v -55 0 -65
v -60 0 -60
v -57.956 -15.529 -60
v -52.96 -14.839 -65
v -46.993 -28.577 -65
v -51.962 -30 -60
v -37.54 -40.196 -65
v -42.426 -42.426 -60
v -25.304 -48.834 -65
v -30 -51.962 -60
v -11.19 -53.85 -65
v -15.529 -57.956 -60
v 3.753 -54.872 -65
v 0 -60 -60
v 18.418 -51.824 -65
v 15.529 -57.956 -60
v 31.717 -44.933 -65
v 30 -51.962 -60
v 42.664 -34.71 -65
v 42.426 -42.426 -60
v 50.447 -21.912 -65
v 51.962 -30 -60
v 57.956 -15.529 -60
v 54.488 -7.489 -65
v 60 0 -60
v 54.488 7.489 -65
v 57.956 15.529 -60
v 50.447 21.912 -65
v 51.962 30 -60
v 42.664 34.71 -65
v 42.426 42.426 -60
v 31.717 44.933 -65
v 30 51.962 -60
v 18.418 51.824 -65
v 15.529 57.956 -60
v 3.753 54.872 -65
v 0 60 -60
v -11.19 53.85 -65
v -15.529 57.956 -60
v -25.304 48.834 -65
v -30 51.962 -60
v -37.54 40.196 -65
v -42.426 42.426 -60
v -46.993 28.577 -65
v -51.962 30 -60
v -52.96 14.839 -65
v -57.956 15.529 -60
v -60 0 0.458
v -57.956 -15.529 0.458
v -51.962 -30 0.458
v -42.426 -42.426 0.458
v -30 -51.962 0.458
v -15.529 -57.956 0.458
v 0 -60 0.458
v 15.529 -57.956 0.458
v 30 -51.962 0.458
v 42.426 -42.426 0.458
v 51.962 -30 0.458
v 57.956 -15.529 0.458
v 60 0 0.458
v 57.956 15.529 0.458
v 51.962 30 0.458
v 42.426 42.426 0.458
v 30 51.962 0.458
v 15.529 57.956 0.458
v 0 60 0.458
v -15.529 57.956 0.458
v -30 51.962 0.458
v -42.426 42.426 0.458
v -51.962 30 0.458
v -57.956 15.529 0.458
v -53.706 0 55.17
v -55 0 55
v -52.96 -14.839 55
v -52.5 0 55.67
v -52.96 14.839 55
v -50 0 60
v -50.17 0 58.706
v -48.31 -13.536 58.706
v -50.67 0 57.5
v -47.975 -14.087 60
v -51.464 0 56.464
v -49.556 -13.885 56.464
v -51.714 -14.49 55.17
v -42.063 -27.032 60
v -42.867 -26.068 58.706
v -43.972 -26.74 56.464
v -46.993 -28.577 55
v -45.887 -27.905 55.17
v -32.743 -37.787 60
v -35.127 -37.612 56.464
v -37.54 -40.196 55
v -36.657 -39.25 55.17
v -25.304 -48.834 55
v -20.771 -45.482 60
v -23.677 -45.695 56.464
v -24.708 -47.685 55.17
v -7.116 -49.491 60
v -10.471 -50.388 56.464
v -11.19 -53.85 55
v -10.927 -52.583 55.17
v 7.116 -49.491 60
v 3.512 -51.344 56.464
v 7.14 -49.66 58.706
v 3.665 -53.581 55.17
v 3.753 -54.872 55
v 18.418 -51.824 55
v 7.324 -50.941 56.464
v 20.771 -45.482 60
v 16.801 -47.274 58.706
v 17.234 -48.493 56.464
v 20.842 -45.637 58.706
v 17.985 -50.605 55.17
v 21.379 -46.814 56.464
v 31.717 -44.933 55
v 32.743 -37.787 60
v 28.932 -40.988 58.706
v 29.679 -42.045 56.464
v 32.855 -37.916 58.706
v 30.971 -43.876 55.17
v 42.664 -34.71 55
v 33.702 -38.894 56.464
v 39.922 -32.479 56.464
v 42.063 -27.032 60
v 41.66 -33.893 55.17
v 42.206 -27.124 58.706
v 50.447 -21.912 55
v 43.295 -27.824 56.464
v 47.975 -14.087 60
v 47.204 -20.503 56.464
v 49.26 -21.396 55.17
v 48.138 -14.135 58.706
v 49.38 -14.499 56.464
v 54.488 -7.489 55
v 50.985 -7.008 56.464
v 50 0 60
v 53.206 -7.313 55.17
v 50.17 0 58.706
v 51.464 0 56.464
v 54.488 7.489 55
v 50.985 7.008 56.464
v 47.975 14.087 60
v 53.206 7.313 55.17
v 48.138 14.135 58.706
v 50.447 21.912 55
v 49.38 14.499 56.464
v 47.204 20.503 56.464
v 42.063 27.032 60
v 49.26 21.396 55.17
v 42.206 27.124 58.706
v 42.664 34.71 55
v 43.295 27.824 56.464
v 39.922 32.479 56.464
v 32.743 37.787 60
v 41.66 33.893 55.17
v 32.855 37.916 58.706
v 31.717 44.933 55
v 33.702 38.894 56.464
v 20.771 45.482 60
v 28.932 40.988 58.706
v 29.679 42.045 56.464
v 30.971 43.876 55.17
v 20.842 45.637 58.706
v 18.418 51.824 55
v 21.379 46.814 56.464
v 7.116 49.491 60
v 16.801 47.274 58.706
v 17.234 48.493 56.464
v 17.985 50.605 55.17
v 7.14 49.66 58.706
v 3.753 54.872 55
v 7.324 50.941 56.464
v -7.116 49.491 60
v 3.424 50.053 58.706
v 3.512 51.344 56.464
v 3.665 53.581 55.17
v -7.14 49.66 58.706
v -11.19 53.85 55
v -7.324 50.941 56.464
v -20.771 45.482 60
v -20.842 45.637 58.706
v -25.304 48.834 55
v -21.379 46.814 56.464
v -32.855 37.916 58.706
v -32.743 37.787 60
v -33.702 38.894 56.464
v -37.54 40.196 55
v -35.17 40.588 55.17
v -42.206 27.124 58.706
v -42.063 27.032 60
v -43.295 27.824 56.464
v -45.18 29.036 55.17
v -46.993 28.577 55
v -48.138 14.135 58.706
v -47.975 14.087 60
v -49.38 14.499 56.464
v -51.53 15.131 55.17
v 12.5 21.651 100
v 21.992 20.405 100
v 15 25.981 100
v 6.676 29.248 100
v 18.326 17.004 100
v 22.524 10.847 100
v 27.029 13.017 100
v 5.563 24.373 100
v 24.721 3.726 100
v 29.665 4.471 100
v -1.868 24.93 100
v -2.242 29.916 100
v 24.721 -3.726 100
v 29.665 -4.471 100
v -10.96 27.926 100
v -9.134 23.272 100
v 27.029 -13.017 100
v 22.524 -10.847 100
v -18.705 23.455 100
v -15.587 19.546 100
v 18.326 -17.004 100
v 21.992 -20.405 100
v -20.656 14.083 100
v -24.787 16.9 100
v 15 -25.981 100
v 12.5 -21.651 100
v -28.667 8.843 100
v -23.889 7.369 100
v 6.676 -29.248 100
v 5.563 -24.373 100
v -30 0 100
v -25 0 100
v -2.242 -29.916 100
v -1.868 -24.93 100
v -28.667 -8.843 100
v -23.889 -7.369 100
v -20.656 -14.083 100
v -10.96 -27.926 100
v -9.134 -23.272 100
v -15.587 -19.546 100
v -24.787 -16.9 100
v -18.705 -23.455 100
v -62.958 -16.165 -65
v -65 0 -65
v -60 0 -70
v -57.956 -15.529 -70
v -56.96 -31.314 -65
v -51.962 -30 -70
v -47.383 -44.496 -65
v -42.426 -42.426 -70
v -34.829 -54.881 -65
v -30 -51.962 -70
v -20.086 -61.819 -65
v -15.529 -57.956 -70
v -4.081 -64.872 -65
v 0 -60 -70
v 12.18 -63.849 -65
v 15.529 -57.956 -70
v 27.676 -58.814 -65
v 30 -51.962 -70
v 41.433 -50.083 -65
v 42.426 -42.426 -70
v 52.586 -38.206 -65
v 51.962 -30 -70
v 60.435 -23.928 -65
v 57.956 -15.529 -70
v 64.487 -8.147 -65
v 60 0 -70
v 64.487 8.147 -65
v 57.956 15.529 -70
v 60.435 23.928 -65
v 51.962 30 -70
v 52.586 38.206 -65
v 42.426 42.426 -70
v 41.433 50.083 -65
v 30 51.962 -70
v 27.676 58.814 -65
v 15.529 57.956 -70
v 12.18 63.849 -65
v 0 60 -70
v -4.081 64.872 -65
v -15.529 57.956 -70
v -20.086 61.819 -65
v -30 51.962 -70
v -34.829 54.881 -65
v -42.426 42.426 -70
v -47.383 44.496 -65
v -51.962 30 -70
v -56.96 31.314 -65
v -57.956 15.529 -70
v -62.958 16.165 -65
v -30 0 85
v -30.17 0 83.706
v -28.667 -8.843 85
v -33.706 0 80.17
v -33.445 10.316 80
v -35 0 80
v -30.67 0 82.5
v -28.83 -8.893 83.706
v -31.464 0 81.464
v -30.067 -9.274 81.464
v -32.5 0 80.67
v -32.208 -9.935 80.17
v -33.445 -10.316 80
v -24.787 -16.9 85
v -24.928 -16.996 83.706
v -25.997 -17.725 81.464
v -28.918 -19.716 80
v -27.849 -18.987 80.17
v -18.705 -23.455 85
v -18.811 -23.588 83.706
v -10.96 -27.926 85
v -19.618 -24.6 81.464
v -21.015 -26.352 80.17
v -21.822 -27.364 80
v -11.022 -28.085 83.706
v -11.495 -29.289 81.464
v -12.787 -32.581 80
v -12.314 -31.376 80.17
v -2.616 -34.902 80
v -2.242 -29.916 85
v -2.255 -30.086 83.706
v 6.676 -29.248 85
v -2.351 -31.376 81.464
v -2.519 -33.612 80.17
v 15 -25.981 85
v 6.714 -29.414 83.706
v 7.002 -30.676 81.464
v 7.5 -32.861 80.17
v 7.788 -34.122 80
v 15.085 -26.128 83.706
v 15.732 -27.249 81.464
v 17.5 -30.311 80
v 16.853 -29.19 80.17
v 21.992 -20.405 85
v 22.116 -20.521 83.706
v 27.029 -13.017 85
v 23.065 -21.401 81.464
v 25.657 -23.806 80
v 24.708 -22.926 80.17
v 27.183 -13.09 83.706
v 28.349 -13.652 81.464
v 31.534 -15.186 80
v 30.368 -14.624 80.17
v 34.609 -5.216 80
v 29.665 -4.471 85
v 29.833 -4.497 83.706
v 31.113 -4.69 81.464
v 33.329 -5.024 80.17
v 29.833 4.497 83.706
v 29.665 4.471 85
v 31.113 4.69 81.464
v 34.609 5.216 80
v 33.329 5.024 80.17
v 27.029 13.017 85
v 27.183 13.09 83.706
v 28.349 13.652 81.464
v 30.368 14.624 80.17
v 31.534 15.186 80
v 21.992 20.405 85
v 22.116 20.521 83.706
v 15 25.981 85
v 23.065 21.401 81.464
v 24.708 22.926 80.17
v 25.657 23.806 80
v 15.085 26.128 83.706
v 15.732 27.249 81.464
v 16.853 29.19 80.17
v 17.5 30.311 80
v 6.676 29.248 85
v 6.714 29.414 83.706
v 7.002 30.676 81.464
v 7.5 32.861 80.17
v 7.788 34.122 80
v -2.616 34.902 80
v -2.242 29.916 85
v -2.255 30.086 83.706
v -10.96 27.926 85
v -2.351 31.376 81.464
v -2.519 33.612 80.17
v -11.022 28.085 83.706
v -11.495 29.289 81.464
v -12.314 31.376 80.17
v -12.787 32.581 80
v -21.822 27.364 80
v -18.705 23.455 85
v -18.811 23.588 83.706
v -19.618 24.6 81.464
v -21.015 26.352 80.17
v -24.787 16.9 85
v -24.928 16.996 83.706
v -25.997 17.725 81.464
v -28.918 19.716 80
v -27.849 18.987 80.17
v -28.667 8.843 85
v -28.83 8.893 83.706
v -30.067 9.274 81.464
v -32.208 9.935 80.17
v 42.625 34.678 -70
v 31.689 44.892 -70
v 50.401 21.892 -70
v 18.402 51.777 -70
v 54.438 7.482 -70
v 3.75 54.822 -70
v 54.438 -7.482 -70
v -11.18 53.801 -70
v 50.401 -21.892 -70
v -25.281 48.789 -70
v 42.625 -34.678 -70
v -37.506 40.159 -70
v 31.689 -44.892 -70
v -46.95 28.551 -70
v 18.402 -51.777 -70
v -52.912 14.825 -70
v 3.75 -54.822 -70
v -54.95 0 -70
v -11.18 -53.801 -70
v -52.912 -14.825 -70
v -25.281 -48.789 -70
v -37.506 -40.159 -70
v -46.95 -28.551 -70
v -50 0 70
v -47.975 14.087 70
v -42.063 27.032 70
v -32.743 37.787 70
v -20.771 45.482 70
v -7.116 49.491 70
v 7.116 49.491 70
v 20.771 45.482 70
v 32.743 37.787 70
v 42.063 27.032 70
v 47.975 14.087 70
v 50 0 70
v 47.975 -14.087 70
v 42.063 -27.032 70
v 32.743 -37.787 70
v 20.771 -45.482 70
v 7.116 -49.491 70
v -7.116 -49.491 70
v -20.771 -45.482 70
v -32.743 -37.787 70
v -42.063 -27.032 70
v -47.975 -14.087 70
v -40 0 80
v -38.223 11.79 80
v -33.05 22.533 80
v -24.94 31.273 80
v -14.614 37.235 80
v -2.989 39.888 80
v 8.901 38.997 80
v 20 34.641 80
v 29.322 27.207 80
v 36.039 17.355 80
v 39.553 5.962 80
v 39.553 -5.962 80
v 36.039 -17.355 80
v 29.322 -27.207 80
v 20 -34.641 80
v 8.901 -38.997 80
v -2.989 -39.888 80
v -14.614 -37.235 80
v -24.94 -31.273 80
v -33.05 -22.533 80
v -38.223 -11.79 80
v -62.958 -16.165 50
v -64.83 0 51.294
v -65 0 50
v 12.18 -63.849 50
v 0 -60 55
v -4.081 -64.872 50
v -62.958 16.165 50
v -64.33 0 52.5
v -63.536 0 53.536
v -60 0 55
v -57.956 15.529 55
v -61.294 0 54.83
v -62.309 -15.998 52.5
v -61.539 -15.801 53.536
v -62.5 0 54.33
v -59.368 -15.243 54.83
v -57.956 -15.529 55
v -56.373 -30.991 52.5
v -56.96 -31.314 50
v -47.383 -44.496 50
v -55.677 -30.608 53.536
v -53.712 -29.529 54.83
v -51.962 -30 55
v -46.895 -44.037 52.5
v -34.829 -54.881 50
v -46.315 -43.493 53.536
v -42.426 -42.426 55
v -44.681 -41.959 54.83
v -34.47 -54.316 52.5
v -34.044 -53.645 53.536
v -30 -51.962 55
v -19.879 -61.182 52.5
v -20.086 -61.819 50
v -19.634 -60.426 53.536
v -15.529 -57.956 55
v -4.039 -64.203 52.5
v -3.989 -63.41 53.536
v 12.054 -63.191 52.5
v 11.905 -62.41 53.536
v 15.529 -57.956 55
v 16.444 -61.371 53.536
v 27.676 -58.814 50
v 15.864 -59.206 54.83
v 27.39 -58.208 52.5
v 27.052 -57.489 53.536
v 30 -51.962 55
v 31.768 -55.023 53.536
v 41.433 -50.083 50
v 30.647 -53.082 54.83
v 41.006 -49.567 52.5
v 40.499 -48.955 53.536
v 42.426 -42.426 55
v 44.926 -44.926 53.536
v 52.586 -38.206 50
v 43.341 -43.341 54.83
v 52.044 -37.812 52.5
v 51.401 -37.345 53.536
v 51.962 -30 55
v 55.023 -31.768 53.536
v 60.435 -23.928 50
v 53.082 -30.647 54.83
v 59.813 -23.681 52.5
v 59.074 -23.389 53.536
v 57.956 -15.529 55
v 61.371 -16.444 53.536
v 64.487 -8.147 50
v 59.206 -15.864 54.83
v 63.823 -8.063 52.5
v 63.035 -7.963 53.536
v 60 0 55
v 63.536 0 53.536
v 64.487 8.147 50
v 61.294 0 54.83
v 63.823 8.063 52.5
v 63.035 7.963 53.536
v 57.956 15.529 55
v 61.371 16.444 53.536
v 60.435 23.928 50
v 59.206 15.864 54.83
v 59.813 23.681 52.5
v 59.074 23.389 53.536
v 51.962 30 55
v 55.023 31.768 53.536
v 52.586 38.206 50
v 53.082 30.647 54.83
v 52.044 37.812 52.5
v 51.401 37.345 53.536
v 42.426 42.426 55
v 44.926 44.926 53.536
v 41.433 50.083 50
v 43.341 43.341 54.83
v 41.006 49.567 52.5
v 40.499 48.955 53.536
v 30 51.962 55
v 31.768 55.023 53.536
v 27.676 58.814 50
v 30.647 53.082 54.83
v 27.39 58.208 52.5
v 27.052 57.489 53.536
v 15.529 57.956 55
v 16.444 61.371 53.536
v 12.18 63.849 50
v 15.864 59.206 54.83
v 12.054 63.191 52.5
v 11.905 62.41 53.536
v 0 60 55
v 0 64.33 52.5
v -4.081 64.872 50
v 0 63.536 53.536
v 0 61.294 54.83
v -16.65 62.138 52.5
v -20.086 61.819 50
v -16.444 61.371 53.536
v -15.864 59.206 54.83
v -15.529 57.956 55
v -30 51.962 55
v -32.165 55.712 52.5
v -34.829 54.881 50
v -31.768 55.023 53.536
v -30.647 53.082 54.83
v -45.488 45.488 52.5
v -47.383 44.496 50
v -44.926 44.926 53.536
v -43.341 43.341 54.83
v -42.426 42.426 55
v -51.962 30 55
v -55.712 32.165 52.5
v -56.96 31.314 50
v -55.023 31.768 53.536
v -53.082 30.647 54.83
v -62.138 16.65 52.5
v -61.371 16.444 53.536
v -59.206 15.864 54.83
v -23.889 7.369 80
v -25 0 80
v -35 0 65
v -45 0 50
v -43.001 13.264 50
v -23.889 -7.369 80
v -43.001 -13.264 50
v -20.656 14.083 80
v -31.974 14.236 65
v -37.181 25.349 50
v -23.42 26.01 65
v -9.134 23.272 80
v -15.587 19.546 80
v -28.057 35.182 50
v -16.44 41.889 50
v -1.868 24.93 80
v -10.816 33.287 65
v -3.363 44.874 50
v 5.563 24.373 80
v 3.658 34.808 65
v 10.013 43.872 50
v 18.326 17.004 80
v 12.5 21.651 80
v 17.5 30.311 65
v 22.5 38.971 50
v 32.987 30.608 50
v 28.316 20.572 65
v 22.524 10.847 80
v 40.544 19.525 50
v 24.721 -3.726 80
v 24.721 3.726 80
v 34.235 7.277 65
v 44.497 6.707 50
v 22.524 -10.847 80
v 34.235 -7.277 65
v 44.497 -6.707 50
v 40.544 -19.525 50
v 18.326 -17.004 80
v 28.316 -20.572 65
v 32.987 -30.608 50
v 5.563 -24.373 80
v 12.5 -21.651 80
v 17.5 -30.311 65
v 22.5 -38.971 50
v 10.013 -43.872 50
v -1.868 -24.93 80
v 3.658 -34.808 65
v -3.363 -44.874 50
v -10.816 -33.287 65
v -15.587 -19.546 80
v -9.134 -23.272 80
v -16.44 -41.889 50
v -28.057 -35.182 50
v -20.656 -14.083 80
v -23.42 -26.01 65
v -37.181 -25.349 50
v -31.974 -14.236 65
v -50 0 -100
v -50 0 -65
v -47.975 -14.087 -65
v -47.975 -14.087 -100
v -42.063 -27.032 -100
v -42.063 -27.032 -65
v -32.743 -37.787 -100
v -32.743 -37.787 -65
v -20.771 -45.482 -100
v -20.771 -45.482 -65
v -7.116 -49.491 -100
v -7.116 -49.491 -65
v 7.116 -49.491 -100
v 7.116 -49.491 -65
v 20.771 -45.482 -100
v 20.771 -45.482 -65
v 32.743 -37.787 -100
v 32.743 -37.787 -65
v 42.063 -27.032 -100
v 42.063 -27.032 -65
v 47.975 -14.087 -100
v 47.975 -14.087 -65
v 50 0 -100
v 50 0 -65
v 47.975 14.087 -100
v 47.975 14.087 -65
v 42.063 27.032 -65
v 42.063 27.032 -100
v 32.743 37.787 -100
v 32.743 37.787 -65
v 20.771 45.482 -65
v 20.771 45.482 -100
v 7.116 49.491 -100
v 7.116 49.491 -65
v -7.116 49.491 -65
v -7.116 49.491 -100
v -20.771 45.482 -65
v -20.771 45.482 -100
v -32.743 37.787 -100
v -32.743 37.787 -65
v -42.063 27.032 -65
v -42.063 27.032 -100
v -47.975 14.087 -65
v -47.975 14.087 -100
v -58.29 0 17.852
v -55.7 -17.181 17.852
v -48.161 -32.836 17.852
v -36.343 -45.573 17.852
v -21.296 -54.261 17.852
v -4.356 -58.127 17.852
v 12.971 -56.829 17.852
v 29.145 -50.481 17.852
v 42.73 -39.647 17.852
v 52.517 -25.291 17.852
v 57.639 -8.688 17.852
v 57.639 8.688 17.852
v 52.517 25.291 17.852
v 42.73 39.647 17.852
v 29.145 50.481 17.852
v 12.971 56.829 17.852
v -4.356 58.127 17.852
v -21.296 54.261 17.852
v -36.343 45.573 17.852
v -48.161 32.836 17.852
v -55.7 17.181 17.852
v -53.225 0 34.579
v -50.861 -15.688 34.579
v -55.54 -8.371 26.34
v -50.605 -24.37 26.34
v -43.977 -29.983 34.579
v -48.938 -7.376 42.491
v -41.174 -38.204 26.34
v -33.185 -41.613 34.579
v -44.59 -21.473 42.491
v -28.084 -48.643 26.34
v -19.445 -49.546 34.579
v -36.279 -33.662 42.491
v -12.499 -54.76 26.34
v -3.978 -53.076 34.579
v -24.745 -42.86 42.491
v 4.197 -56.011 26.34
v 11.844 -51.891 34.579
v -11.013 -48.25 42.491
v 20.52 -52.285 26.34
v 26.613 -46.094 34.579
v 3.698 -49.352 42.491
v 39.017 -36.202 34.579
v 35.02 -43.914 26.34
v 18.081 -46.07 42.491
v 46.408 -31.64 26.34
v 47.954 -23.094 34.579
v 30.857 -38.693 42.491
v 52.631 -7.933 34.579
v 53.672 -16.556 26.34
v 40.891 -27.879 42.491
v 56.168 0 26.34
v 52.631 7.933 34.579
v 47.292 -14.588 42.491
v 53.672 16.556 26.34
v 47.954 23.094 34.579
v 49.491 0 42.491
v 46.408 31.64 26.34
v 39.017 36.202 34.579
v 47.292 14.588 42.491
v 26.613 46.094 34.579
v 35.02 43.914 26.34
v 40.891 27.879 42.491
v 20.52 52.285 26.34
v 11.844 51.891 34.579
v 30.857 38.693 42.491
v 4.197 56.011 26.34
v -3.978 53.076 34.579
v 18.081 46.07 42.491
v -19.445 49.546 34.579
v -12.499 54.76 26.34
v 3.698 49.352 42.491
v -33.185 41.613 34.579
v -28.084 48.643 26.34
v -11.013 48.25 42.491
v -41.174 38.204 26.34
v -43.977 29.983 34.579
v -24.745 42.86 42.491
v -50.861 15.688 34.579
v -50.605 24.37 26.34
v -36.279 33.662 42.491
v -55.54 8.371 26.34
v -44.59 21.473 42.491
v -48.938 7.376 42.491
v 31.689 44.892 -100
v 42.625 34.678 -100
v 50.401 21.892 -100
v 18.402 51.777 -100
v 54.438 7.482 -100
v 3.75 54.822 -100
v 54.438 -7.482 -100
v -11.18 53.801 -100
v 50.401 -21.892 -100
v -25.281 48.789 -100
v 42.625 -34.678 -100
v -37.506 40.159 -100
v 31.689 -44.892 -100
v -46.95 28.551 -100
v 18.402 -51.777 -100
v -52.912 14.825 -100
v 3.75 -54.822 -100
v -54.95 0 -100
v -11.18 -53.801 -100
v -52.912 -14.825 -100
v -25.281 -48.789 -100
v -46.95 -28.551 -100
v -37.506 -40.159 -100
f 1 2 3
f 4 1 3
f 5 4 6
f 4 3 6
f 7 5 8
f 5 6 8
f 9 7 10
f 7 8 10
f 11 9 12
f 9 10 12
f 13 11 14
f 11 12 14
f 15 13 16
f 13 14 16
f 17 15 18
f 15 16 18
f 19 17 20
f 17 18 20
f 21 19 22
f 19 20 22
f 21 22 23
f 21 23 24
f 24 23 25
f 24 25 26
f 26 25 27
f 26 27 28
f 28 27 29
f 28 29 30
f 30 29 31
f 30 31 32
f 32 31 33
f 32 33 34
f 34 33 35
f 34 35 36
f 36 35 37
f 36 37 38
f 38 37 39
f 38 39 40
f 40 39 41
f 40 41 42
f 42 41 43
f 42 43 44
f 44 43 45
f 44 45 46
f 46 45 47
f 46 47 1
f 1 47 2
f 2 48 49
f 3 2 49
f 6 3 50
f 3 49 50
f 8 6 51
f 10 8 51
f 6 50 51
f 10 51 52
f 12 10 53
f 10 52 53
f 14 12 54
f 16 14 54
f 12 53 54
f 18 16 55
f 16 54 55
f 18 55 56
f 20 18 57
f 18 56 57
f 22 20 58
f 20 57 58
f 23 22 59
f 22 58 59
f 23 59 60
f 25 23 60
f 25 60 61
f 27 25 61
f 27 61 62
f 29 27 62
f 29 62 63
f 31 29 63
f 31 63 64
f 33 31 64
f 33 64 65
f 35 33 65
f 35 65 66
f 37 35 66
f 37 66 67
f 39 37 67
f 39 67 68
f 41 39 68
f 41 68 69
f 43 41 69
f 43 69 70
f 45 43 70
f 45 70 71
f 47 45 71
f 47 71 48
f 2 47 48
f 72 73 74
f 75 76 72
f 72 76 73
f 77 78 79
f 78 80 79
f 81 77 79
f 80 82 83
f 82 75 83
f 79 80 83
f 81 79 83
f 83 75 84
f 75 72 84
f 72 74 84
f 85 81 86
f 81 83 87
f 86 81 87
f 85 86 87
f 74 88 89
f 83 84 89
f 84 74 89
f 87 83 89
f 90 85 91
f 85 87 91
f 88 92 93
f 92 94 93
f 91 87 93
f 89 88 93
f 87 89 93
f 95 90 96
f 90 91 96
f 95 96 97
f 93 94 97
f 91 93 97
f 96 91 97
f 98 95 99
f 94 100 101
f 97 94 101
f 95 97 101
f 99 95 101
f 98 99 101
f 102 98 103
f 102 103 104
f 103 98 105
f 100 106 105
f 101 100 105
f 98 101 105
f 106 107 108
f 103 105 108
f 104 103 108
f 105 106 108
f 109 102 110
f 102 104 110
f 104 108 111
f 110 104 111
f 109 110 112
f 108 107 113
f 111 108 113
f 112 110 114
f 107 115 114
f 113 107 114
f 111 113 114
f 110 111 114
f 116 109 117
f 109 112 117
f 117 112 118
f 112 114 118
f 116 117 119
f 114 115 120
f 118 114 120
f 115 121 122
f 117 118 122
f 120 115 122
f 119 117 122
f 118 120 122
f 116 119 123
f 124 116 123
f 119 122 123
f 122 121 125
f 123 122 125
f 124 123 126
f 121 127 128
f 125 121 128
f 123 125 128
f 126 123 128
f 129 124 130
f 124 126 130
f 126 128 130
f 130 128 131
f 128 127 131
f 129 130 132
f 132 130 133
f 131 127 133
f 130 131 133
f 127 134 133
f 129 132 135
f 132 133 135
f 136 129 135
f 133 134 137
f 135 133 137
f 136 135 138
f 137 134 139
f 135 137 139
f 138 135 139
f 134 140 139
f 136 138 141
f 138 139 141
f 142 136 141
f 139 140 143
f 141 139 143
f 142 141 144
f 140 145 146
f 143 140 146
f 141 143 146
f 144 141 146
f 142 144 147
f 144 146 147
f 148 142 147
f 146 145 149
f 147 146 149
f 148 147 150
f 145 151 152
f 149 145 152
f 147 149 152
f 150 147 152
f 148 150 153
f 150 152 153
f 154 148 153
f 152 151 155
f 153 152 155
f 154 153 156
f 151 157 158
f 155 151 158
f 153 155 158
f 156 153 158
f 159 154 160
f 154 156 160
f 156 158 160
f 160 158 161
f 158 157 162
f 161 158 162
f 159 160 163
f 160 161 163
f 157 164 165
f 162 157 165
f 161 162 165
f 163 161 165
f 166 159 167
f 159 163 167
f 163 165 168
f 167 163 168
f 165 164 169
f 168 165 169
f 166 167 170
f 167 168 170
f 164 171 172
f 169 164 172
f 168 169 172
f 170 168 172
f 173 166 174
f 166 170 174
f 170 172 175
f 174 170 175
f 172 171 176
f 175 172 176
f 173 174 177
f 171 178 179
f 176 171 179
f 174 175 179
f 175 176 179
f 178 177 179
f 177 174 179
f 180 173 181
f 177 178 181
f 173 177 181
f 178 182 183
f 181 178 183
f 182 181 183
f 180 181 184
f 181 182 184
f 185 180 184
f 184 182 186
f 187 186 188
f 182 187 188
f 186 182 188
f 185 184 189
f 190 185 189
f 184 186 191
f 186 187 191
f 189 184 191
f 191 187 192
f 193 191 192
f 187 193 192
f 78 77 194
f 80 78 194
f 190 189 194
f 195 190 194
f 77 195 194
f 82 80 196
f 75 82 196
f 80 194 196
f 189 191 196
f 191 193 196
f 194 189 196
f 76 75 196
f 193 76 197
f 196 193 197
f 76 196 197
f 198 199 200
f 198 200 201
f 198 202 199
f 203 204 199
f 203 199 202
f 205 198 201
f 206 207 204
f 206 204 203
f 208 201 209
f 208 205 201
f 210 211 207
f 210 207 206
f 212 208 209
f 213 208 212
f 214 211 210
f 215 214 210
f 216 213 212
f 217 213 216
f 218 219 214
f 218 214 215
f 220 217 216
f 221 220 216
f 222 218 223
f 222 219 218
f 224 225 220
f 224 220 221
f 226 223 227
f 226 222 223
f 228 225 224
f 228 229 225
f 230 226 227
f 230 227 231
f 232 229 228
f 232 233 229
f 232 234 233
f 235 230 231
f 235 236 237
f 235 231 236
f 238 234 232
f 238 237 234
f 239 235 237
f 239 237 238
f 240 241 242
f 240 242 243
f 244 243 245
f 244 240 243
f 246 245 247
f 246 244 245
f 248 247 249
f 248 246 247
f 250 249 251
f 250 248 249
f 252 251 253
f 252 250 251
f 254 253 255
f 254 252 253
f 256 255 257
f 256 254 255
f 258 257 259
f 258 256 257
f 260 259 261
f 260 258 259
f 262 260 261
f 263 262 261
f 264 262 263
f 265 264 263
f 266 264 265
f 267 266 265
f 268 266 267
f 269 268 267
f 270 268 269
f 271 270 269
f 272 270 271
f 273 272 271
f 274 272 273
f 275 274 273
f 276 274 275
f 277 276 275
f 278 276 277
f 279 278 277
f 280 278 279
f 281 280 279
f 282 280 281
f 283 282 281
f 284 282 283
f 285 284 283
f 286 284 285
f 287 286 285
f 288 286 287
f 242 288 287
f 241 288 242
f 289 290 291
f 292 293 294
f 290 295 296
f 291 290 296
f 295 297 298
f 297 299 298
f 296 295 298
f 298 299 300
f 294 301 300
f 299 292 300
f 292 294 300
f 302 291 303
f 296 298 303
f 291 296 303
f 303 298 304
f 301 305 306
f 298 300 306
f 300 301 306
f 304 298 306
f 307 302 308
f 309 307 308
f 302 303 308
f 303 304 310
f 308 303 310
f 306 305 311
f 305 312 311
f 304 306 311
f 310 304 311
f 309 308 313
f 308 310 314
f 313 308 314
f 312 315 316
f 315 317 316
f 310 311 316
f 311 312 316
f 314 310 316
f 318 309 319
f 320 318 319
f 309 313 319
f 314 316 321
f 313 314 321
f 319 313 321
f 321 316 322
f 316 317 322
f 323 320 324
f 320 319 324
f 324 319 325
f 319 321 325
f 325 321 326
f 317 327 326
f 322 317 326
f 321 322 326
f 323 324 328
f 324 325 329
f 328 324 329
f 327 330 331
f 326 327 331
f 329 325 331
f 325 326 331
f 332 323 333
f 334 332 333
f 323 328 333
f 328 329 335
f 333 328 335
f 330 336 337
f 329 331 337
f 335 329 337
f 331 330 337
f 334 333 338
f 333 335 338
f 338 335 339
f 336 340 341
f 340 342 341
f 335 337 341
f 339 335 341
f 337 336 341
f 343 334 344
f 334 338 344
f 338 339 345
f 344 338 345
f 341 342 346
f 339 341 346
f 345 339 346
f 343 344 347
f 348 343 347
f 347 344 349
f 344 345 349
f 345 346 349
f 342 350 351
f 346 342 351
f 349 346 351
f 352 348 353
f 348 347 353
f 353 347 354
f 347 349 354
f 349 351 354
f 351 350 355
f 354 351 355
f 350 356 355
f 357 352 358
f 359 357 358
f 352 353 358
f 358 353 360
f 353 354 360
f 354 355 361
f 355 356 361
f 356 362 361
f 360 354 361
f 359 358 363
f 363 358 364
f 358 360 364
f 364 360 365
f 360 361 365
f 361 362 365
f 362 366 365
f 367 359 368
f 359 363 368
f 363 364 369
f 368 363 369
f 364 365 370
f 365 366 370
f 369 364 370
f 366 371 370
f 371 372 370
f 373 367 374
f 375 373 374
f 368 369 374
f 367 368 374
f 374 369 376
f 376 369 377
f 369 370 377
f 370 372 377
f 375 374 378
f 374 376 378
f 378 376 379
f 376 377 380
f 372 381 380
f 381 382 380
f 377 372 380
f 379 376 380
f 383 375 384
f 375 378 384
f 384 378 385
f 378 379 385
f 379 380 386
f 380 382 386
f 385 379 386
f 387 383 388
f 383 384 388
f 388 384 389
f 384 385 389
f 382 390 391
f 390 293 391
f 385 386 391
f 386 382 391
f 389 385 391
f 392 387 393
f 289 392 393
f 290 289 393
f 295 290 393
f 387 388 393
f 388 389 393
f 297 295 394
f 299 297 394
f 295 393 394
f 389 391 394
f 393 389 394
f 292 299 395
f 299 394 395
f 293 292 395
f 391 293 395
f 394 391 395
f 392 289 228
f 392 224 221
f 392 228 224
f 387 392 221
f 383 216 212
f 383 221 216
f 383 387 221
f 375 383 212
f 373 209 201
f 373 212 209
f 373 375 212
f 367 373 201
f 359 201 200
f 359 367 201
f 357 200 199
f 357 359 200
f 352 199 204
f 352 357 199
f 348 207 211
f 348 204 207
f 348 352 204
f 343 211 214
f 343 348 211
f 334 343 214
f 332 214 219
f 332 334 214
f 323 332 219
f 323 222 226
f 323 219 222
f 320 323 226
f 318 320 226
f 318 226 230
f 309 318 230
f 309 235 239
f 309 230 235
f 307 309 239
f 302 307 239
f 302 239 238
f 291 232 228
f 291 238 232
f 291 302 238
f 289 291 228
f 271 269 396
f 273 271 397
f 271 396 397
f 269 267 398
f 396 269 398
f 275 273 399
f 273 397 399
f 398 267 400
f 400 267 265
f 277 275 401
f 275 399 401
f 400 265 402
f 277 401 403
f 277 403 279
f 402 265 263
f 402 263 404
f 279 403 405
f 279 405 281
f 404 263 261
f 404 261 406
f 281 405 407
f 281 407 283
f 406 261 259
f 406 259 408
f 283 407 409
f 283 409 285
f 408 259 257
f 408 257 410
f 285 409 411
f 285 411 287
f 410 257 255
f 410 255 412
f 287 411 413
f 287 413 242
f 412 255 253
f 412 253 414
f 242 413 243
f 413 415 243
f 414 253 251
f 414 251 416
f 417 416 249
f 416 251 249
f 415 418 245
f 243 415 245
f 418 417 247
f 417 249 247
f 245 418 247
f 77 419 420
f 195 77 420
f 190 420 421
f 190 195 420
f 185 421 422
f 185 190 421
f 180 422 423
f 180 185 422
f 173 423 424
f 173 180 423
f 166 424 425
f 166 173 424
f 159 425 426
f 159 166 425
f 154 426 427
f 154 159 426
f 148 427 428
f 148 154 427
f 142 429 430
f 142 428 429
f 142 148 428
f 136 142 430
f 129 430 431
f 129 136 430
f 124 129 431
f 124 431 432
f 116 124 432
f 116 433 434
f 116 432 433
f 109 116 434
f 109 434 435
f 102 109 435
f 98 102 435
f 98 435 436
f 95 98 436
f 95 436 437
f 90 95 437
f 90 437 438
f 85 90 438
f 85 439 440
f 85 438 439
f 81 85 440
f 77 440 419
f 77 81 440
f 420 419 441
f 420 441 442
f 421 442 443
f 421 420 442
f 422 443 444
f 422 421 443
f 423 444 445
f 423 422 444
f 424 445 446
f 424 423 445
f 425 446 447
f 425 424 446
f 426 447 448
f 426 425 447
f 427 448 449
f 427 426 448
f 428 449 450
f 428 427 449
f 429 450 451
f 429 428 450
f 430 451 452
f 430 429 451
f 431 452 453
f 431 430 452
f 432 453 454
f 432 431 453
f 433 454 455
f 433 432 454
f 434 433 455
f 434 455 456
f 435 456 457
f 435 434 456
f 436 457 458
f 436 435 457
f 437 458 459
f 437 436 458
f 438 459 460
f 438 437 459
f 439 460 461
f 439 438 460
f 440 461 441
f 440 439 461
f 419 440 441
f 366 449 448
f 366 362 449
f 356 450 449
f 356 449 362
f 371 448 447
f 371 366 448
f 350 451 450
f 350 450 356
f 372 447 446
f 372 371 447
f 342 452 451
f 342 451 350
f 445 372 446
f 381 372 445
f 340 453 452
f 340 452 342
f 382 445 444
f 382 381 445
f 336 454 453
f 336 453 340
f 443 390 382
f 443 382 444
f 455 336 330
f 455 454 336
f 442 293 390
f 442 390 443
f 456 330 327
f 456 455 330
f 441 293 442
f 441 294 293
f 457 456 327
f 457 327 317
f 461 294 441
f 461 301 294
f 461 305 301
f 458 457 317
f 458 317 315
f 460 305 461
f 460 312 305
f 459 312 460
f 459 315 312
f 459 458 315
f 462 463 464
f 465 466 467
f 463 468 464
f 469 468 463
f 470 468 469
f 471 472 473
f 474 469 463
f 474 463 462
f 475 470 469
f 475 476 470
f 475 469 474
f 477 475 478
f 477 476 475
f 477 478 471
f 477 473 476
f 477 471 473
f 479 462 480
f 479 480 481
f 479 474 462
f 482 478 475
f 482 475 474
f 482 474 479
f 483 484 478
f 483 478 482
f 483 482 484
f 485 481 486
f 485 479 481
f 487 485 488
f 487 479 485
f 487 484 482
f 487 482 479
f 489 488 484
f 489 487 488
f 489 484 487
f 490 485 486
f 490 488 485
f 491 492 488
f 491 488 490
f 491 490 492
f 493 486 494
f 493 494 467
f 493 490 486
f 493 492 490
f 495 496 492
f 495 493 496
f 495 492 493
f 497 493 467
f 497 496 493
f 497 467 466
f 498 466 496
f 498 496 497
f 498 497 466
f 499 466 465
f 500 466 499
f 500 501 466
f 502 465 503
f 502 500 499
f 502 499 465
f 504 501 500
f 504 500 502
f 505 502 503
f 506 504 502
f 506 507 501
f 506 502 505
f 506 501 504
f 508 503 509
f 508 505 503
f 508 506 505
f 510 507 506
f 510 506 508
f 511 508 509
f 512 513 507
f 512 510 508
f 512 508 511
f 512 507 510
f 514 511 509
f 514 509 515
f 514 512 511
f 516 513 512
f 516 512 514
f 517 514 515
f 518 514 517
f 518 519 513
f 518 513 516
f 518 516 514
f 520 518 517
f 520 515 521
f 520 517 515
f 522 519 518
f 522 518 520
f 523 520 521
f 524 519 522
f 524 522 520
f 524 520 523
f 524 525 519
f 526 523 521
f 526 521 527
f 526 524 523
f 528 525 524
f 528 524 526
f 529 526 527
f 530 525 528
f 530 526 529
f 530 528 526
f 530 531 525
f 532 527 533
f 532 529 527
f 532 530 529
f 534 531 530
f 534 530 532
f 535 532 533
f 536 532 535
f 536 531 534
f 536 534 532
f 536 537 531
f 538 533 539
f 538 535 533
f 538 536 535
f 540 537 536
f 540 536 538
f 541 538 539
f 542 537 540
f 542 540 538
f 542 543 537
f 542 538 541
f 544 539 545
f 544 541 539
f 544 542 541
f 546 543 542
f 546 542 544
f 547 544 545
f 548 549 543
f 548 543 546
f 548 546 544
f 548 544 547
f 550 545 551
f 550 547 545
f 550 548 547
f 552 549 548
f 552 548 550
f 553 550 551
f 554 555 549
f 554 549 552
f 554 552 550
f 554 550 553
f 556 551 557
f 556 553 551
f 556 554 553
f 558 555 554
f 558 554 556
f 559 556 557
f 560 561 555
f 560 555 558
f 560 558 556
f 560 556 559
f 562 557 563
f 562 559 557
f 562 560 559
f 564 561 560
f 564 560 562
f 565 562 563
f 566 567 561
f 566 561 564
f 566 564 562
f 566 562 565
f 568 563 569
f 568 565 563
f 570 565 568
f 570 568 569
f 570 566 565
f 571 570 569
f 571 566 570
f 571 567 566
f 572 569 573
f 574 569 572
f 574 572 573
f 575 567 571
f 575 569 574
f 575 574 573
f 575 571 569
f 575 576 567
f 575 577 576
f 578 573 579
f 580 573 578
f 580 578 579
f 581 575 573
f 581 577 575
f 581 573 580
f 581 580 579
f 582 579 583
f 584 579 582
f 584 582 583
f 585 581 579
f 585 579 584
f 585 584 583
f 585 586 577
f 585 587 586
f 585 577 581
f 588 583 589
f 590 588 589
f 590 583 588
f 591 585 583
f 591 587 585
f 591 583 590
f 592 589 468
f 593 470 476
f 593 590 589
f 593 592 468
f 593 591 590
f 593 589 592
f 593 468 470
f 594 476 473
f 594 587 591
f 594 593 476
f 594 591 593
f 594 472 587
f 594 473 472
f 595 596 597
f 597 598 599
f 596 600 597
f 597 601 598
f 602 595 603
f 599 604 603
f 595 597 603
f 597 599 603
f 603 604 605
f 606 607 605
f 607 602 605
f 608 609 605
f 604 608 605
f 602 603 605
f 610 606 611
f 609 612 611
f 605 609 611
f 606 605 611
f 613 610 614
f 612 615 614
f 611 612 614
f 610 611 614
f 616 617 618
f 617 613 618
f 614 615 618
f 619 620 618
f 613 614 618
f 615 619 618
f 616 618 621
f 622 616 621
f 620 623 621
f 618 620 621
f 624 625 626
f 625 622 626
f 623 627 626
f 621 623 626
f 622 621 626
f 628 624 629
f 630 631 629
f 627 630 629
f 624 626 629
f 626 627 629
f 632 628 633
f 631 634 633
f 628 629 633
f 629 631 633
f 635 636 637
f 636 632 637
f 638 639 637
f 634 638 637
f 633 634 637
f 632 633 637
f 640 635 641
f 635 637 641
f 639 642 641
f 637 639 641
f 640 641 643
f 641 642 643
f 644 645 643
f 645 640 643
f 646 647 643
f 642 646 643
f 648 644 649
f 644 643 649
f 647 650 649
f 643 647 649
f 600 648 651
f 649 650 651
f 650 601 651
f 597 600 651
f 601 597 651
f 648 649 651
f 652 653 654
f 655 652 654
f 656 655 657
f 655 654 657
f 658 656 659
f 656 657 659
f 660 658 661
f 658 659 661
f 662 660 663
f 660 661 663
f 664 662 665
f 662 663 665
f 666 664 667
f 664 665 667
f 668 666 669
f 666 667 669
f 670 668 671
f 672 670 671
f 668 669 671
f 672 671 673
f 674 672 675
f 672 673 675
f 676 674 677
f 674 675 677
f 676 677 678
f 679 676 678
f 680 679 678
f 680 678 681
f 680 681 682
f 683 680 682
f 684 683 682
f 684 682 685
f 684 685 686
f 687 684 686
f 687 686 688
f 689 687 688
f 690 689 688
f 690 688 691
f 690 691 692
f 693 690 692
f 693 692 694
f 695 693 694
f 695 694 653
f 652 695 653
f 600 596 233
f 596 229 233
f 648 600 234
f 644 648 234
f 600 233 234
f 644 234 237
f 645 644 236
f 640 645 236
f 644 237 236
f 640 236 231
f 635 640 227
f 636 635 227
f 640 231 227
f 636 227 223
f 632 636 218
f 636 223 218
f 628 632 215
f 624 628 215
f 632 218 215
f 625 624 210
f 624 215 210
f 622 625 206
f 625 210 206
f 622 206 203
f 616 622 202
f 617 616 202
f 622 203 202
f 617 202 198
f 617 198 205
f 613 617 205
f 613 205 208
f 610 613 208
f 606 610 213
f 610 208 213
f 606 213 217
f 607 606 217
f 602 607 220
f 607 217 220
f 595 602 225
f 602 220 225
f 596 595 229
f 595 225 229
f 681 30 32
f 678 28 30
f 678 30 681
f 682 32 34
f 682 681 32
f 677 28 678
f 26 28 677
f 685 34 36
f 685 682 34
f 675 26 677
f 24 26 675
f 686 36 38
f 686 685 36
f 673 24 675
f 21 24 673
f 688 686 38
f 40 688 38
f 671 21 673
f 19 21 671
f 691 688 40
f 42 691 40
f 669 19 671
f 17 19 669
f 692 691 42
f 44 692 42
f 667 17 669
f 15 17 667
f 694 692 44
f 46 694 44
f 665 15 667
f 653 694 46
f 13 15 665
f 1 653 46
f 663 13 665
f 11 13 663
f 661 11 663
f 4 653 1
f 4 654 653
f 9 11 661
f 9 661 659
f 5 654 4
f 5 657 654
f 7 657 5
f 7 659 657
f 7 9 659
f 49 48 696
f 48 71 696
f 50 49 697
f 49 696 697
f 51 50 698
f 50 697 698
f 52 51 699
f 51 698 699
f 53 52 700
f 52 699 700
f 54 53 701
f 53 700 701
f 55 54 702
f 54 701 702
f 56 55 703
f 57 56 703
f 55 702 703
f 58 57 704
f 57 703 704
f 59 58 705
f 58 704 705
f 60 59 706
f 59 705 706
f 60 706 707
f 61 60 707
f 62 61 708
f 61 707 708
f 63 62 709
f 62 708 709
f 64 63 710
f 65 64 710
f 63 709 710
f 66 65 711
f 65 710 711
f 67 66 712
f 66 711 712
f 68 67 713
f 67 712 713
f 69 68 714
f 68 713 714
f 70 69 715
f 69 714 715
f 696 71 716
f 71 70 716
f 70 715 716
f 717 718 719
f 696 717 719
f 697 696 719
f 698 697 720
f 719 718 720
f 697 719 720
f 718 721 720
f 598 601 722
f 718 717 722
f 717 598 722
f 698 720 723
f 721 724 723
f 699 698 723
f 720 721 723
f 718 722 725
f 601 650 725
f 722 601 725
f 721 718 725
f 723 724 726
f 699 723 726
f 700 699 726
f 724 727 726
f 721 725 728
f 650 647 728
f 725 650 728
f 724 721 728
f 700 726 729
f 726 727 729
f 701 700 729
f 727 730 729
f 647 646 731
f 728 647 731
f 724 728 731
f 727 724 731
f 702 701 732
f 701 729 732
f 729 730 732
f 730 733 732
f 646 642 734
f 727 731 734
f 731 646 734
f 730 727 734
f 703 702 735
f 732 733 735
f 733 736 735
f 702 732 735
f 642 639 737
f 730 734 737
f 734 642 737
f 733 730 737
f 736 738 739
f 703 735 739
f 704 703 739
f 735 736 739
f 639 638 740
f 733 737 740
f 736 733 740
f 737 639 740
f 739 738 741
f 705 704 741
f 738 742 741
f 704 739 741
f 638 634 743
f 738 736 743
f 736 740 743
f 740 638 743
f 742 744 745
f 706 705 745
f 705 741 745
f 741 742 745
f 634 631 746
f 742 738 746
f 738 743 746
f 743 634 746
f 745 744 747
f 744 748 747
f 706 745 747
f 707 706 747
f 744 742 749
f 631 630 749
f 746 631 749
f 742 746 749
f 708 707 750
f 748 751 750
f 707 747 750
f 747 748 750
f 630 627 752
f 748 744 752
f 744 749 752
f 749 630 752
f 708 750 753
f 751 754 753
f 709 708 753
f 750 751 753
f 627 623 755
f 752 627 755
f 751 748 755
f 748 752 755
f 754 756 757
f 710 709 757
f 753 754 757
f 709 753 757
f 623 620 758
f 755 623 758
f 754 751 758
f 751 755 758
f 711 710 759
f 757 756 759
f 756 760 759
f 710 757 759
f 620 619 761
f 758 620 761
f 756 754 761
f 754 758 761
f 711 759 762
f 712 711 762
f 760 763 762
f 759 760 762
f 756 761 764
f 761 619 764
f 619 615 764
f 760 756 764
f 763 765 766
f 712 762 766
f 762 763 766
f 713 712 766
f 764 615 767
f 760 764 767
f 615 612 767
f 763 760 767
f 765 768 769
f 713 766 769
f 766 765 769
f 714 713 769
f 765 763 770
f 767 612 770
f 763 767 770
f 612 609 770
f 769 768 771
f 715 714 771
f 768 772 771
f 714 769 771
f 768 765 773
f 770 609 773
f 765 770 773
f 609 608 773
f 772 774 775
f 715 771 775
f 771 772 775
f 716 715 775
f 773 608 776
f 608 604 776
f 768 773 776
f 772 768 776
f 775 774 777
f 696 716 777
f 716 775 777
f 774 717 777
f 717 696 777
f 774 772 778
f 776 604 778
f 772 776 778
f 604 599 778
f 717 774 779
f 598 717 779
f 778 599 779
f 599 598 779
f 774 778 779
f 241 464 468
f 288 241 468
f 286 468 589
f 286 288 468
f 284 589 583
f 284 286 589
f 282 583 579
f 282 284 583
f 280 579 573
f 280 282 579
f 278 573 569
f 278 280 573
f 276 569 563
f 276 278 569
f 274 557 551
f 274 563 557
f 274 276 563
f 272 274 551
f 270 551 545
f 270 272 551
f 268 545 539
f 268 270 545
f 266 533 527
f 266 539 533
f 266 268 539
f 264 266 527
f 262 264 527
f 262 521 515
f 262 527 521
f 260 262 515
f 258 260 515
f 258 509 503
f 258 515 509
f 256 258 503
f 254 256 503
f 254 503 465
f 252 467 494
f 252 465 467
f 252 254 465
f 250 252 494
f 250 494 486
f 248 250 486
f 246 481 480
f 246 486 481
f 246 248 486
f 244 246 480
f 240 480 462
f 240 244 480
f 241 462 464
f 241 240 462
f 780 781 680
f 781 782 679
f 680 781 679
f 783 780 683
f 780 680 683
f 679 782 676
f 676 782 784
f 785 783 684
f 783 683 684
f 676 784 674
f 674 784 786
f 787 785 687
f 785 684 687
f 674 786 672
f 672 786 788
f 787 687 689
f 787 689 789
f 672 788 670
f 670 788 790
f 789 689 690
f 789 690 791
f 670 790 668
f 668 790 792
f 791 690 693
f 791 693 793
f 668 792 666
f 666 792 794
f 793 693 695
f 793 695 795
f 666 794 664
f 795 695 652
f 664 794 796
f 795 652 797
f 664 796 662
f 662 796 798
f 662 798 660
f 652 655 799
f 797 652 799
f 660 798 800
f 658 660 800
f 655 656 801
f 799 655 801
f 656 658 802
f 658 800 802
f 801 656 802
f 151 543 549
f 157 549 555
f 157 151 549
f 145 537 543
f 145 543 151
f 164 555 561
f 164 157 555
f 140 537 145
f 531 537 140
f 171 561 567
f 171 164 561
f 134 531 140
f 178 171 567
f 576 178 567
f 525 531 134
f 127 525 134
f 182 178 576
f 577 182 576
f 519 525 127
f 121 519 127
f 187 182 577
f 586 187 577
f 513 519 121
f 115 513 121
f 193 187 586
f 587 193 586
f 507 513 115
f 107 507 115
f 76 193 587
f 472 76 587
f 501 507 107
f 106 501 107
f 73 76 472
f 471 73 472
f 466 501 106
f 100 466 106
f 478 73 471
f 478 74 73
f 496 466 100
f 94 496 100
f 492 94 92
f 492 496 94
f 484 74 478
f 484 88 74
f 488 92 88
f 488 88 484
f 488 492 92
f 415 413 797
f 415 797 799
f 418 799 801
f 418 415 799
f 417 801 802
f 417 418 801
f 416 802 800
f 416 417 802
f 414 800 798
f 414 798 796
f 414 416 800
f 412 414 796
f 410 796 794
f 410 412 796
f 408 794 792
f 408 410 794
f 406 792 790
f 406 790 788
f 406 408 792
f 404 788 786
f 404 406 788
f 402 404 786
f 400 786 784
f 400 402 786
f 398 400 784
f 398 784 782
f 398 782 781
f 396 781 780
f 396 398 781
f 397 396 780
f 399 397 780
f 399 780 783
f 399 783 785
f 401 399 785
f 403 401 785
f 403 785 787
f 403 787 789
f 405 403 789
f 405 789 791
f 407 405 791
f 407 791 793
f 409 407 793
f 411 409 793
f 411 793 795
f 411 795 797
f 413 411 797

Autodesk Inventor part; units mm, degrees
sketch "Sketch6" plane through (0, 0, 0) normal (0, 1, 0) x (-1, 0, 0)
  line L0 (0, -100) -> (0, 100)
  line L1 (50, -100) -> (50, -65)
  line L2 (60, -60) -> (60, 0.4584)
  line L3 (55, -65) -> (50, -65)
  line L4 (60, 50) -> (45, 50) construction
  line L5 (25, 80) -> (25, 100)
  line L6 (30, 100) -> (30, 85)
  line L7 (55, 55) -> (60, 55)
  line L8 (65, 50) -> (65, -65)
  line L9 (55, -100) -> (50, -100)
  line L10 (30, 100) -> (25, 100)
  line L11 (45, 50) -> (45, 50)
  line L12 (25, 80) -> (25, 80)
  line L13 (45, 50) -> (25, 80)
  arc A0 (65, 50) -> (60, 55) centre (60, 50) ccw
  arc A1 (50, 60) -> (55, 55) centre (55, 60) ccw
  line L14 (65, -65) -> (60, -70)
  line L15 (60, -60) -> (55, -65)
  line L16 (60, 45) -> (60, 45)
  line L17 (55, 50) -> (55, 50)
  line L18 (35, 80) -> (40, 80)
  line L19 (50, 70) -> (50, 60)
  line L20 (40, 80) -> (50, 70)
  line L21 (54.95, -100) -> (54.95, -70)
  line L22 (60, -70) -> (54.95, -70)
  arc A2 (30, 85) -> (35, 80) centre (35, 85) ccw
  arc A3 (60, 0.4584) -> (45, 50) centre (-29.3125, 0.4584) ccw
  point P0 (0, 0)
  point P1 (0, 0)
  point P2 (60, -65)
  point P3 (30, 80)
  point P4 (65, -70)
  point P5 (25, 50)
  point P6 (50, 80)
  dimension "d88" = 200
  dimension "d89" = 35
  dimension "d90" = 115
  dimension "d91" = 100
  dimension "d92" = 120
  dimension "d95" = 50
  dimension "d96" = 20
  dimension "d97" = 30
  dimension "d99" = 5
  dimension "d100" = 5
  dimension "d101" = 5
  dimension "d102" = 5
  dimension "d103" = 5
  dimension "d107" = 10
  dimension "d108" = 10
  dimension "d109" = 109.9
  dimension "d127" = 5
revolve "Revolution5" add sketch "Sketch6" angle 360 about axis through (0, 0, -100) along (0, 0, 1)
ref_plane "Work Plane2" through (65, 0, -7.5) normal (1, 0, 0) x (0, 1, 0)
sketch "Sketch17" plane through (65, 0, -7.5) normal (1, 0, 0) x (0, 1, 0)
  point P0 (0, 7.5)
ref_plane "Work Plane5" through (57.6628, -30, -7.5) normal (0, 0, -1) x (-1, 0, 0)
sketch "Sketch19" plane through (57.6628, -30, -7.5) normal (0, 0, -1) x (-1, 0, 0)
  line L0 (-2.3372, 5) -> (-2.3372, 0)
  line L1 (-2.3372, 30) -> (27.6628, 30) construction
  line L2 (0, 60) -> (-2.3372, 60)
  line L3 (-2.3372, 55) -> (-2.3372, 60)
  line L4 (-2.3372, 0) -> (0, 0)
  circle A0 centre (57.6628, 30) radius 65 projected
  point P0 (57.6628, 30)
  dimension "d159" = 90
extrude "Extrusion11" [suppressed]
ref_plane "Work Plane6" through (60, 25, -7.5) normal (1, 0, 0) x (0, 0, -1)
sketch "Sketch20" plane through (60, 25, -7.5) normal (1, 0, 0) x (0, 0, -1)
  line L0 (0, 5) -> (0, -55)
  line L1 (50, 0) -> (50, 5) projected
  line L2 (50, 5) -> (50, -55)
  line L3 (0, 5) -> (50, 5) projected
  line L4 (50, 5) -> (0, 5)
  line L5 (50, -55) -> (0, -55) projected
  line L6 (0, -55) -> (50, -55)
  line L7 (0, 5) -> (0, -55)
  circle A0 centre (25, -25) radius 20
  point P0 (-7.5, -25)
  dimension "d170" = 40
extrude "Extrusion12" [suppressed]
sketch "Sketch23" plane through (65, 25, -7.5) normal (1, 0, 0) x (0, 0, -1)
  arc A0 (45, -25) -> (5, -25) centre (25, -25) ccw projected
  circle A1 centre (25, -25) radius 22.5
  arc A2 (5, -25) -> (45, -25) centre (25, -25) ccw projected
  point P0 (-7.5, -25)
  dimension "d171" = 45
extrude "Extrusion14" [suppressed]
sketch "Sketch24" plane through (80, 0, -32.5) normal (1, 0, 0) x (0, 0, -1)
  circle A0 centre (0, 0) radius 20 projected
  circle A1 centre (0, 0) radius 20
  point P0 (-32.5, 0)
  dimension "d174" = 40
extrude "Extrusion15" [suppressed]
fillet "Fillet3" [suppressed]
properties part number "LOWER-NOZZLEv2" material "PC/ABS Plastic"
